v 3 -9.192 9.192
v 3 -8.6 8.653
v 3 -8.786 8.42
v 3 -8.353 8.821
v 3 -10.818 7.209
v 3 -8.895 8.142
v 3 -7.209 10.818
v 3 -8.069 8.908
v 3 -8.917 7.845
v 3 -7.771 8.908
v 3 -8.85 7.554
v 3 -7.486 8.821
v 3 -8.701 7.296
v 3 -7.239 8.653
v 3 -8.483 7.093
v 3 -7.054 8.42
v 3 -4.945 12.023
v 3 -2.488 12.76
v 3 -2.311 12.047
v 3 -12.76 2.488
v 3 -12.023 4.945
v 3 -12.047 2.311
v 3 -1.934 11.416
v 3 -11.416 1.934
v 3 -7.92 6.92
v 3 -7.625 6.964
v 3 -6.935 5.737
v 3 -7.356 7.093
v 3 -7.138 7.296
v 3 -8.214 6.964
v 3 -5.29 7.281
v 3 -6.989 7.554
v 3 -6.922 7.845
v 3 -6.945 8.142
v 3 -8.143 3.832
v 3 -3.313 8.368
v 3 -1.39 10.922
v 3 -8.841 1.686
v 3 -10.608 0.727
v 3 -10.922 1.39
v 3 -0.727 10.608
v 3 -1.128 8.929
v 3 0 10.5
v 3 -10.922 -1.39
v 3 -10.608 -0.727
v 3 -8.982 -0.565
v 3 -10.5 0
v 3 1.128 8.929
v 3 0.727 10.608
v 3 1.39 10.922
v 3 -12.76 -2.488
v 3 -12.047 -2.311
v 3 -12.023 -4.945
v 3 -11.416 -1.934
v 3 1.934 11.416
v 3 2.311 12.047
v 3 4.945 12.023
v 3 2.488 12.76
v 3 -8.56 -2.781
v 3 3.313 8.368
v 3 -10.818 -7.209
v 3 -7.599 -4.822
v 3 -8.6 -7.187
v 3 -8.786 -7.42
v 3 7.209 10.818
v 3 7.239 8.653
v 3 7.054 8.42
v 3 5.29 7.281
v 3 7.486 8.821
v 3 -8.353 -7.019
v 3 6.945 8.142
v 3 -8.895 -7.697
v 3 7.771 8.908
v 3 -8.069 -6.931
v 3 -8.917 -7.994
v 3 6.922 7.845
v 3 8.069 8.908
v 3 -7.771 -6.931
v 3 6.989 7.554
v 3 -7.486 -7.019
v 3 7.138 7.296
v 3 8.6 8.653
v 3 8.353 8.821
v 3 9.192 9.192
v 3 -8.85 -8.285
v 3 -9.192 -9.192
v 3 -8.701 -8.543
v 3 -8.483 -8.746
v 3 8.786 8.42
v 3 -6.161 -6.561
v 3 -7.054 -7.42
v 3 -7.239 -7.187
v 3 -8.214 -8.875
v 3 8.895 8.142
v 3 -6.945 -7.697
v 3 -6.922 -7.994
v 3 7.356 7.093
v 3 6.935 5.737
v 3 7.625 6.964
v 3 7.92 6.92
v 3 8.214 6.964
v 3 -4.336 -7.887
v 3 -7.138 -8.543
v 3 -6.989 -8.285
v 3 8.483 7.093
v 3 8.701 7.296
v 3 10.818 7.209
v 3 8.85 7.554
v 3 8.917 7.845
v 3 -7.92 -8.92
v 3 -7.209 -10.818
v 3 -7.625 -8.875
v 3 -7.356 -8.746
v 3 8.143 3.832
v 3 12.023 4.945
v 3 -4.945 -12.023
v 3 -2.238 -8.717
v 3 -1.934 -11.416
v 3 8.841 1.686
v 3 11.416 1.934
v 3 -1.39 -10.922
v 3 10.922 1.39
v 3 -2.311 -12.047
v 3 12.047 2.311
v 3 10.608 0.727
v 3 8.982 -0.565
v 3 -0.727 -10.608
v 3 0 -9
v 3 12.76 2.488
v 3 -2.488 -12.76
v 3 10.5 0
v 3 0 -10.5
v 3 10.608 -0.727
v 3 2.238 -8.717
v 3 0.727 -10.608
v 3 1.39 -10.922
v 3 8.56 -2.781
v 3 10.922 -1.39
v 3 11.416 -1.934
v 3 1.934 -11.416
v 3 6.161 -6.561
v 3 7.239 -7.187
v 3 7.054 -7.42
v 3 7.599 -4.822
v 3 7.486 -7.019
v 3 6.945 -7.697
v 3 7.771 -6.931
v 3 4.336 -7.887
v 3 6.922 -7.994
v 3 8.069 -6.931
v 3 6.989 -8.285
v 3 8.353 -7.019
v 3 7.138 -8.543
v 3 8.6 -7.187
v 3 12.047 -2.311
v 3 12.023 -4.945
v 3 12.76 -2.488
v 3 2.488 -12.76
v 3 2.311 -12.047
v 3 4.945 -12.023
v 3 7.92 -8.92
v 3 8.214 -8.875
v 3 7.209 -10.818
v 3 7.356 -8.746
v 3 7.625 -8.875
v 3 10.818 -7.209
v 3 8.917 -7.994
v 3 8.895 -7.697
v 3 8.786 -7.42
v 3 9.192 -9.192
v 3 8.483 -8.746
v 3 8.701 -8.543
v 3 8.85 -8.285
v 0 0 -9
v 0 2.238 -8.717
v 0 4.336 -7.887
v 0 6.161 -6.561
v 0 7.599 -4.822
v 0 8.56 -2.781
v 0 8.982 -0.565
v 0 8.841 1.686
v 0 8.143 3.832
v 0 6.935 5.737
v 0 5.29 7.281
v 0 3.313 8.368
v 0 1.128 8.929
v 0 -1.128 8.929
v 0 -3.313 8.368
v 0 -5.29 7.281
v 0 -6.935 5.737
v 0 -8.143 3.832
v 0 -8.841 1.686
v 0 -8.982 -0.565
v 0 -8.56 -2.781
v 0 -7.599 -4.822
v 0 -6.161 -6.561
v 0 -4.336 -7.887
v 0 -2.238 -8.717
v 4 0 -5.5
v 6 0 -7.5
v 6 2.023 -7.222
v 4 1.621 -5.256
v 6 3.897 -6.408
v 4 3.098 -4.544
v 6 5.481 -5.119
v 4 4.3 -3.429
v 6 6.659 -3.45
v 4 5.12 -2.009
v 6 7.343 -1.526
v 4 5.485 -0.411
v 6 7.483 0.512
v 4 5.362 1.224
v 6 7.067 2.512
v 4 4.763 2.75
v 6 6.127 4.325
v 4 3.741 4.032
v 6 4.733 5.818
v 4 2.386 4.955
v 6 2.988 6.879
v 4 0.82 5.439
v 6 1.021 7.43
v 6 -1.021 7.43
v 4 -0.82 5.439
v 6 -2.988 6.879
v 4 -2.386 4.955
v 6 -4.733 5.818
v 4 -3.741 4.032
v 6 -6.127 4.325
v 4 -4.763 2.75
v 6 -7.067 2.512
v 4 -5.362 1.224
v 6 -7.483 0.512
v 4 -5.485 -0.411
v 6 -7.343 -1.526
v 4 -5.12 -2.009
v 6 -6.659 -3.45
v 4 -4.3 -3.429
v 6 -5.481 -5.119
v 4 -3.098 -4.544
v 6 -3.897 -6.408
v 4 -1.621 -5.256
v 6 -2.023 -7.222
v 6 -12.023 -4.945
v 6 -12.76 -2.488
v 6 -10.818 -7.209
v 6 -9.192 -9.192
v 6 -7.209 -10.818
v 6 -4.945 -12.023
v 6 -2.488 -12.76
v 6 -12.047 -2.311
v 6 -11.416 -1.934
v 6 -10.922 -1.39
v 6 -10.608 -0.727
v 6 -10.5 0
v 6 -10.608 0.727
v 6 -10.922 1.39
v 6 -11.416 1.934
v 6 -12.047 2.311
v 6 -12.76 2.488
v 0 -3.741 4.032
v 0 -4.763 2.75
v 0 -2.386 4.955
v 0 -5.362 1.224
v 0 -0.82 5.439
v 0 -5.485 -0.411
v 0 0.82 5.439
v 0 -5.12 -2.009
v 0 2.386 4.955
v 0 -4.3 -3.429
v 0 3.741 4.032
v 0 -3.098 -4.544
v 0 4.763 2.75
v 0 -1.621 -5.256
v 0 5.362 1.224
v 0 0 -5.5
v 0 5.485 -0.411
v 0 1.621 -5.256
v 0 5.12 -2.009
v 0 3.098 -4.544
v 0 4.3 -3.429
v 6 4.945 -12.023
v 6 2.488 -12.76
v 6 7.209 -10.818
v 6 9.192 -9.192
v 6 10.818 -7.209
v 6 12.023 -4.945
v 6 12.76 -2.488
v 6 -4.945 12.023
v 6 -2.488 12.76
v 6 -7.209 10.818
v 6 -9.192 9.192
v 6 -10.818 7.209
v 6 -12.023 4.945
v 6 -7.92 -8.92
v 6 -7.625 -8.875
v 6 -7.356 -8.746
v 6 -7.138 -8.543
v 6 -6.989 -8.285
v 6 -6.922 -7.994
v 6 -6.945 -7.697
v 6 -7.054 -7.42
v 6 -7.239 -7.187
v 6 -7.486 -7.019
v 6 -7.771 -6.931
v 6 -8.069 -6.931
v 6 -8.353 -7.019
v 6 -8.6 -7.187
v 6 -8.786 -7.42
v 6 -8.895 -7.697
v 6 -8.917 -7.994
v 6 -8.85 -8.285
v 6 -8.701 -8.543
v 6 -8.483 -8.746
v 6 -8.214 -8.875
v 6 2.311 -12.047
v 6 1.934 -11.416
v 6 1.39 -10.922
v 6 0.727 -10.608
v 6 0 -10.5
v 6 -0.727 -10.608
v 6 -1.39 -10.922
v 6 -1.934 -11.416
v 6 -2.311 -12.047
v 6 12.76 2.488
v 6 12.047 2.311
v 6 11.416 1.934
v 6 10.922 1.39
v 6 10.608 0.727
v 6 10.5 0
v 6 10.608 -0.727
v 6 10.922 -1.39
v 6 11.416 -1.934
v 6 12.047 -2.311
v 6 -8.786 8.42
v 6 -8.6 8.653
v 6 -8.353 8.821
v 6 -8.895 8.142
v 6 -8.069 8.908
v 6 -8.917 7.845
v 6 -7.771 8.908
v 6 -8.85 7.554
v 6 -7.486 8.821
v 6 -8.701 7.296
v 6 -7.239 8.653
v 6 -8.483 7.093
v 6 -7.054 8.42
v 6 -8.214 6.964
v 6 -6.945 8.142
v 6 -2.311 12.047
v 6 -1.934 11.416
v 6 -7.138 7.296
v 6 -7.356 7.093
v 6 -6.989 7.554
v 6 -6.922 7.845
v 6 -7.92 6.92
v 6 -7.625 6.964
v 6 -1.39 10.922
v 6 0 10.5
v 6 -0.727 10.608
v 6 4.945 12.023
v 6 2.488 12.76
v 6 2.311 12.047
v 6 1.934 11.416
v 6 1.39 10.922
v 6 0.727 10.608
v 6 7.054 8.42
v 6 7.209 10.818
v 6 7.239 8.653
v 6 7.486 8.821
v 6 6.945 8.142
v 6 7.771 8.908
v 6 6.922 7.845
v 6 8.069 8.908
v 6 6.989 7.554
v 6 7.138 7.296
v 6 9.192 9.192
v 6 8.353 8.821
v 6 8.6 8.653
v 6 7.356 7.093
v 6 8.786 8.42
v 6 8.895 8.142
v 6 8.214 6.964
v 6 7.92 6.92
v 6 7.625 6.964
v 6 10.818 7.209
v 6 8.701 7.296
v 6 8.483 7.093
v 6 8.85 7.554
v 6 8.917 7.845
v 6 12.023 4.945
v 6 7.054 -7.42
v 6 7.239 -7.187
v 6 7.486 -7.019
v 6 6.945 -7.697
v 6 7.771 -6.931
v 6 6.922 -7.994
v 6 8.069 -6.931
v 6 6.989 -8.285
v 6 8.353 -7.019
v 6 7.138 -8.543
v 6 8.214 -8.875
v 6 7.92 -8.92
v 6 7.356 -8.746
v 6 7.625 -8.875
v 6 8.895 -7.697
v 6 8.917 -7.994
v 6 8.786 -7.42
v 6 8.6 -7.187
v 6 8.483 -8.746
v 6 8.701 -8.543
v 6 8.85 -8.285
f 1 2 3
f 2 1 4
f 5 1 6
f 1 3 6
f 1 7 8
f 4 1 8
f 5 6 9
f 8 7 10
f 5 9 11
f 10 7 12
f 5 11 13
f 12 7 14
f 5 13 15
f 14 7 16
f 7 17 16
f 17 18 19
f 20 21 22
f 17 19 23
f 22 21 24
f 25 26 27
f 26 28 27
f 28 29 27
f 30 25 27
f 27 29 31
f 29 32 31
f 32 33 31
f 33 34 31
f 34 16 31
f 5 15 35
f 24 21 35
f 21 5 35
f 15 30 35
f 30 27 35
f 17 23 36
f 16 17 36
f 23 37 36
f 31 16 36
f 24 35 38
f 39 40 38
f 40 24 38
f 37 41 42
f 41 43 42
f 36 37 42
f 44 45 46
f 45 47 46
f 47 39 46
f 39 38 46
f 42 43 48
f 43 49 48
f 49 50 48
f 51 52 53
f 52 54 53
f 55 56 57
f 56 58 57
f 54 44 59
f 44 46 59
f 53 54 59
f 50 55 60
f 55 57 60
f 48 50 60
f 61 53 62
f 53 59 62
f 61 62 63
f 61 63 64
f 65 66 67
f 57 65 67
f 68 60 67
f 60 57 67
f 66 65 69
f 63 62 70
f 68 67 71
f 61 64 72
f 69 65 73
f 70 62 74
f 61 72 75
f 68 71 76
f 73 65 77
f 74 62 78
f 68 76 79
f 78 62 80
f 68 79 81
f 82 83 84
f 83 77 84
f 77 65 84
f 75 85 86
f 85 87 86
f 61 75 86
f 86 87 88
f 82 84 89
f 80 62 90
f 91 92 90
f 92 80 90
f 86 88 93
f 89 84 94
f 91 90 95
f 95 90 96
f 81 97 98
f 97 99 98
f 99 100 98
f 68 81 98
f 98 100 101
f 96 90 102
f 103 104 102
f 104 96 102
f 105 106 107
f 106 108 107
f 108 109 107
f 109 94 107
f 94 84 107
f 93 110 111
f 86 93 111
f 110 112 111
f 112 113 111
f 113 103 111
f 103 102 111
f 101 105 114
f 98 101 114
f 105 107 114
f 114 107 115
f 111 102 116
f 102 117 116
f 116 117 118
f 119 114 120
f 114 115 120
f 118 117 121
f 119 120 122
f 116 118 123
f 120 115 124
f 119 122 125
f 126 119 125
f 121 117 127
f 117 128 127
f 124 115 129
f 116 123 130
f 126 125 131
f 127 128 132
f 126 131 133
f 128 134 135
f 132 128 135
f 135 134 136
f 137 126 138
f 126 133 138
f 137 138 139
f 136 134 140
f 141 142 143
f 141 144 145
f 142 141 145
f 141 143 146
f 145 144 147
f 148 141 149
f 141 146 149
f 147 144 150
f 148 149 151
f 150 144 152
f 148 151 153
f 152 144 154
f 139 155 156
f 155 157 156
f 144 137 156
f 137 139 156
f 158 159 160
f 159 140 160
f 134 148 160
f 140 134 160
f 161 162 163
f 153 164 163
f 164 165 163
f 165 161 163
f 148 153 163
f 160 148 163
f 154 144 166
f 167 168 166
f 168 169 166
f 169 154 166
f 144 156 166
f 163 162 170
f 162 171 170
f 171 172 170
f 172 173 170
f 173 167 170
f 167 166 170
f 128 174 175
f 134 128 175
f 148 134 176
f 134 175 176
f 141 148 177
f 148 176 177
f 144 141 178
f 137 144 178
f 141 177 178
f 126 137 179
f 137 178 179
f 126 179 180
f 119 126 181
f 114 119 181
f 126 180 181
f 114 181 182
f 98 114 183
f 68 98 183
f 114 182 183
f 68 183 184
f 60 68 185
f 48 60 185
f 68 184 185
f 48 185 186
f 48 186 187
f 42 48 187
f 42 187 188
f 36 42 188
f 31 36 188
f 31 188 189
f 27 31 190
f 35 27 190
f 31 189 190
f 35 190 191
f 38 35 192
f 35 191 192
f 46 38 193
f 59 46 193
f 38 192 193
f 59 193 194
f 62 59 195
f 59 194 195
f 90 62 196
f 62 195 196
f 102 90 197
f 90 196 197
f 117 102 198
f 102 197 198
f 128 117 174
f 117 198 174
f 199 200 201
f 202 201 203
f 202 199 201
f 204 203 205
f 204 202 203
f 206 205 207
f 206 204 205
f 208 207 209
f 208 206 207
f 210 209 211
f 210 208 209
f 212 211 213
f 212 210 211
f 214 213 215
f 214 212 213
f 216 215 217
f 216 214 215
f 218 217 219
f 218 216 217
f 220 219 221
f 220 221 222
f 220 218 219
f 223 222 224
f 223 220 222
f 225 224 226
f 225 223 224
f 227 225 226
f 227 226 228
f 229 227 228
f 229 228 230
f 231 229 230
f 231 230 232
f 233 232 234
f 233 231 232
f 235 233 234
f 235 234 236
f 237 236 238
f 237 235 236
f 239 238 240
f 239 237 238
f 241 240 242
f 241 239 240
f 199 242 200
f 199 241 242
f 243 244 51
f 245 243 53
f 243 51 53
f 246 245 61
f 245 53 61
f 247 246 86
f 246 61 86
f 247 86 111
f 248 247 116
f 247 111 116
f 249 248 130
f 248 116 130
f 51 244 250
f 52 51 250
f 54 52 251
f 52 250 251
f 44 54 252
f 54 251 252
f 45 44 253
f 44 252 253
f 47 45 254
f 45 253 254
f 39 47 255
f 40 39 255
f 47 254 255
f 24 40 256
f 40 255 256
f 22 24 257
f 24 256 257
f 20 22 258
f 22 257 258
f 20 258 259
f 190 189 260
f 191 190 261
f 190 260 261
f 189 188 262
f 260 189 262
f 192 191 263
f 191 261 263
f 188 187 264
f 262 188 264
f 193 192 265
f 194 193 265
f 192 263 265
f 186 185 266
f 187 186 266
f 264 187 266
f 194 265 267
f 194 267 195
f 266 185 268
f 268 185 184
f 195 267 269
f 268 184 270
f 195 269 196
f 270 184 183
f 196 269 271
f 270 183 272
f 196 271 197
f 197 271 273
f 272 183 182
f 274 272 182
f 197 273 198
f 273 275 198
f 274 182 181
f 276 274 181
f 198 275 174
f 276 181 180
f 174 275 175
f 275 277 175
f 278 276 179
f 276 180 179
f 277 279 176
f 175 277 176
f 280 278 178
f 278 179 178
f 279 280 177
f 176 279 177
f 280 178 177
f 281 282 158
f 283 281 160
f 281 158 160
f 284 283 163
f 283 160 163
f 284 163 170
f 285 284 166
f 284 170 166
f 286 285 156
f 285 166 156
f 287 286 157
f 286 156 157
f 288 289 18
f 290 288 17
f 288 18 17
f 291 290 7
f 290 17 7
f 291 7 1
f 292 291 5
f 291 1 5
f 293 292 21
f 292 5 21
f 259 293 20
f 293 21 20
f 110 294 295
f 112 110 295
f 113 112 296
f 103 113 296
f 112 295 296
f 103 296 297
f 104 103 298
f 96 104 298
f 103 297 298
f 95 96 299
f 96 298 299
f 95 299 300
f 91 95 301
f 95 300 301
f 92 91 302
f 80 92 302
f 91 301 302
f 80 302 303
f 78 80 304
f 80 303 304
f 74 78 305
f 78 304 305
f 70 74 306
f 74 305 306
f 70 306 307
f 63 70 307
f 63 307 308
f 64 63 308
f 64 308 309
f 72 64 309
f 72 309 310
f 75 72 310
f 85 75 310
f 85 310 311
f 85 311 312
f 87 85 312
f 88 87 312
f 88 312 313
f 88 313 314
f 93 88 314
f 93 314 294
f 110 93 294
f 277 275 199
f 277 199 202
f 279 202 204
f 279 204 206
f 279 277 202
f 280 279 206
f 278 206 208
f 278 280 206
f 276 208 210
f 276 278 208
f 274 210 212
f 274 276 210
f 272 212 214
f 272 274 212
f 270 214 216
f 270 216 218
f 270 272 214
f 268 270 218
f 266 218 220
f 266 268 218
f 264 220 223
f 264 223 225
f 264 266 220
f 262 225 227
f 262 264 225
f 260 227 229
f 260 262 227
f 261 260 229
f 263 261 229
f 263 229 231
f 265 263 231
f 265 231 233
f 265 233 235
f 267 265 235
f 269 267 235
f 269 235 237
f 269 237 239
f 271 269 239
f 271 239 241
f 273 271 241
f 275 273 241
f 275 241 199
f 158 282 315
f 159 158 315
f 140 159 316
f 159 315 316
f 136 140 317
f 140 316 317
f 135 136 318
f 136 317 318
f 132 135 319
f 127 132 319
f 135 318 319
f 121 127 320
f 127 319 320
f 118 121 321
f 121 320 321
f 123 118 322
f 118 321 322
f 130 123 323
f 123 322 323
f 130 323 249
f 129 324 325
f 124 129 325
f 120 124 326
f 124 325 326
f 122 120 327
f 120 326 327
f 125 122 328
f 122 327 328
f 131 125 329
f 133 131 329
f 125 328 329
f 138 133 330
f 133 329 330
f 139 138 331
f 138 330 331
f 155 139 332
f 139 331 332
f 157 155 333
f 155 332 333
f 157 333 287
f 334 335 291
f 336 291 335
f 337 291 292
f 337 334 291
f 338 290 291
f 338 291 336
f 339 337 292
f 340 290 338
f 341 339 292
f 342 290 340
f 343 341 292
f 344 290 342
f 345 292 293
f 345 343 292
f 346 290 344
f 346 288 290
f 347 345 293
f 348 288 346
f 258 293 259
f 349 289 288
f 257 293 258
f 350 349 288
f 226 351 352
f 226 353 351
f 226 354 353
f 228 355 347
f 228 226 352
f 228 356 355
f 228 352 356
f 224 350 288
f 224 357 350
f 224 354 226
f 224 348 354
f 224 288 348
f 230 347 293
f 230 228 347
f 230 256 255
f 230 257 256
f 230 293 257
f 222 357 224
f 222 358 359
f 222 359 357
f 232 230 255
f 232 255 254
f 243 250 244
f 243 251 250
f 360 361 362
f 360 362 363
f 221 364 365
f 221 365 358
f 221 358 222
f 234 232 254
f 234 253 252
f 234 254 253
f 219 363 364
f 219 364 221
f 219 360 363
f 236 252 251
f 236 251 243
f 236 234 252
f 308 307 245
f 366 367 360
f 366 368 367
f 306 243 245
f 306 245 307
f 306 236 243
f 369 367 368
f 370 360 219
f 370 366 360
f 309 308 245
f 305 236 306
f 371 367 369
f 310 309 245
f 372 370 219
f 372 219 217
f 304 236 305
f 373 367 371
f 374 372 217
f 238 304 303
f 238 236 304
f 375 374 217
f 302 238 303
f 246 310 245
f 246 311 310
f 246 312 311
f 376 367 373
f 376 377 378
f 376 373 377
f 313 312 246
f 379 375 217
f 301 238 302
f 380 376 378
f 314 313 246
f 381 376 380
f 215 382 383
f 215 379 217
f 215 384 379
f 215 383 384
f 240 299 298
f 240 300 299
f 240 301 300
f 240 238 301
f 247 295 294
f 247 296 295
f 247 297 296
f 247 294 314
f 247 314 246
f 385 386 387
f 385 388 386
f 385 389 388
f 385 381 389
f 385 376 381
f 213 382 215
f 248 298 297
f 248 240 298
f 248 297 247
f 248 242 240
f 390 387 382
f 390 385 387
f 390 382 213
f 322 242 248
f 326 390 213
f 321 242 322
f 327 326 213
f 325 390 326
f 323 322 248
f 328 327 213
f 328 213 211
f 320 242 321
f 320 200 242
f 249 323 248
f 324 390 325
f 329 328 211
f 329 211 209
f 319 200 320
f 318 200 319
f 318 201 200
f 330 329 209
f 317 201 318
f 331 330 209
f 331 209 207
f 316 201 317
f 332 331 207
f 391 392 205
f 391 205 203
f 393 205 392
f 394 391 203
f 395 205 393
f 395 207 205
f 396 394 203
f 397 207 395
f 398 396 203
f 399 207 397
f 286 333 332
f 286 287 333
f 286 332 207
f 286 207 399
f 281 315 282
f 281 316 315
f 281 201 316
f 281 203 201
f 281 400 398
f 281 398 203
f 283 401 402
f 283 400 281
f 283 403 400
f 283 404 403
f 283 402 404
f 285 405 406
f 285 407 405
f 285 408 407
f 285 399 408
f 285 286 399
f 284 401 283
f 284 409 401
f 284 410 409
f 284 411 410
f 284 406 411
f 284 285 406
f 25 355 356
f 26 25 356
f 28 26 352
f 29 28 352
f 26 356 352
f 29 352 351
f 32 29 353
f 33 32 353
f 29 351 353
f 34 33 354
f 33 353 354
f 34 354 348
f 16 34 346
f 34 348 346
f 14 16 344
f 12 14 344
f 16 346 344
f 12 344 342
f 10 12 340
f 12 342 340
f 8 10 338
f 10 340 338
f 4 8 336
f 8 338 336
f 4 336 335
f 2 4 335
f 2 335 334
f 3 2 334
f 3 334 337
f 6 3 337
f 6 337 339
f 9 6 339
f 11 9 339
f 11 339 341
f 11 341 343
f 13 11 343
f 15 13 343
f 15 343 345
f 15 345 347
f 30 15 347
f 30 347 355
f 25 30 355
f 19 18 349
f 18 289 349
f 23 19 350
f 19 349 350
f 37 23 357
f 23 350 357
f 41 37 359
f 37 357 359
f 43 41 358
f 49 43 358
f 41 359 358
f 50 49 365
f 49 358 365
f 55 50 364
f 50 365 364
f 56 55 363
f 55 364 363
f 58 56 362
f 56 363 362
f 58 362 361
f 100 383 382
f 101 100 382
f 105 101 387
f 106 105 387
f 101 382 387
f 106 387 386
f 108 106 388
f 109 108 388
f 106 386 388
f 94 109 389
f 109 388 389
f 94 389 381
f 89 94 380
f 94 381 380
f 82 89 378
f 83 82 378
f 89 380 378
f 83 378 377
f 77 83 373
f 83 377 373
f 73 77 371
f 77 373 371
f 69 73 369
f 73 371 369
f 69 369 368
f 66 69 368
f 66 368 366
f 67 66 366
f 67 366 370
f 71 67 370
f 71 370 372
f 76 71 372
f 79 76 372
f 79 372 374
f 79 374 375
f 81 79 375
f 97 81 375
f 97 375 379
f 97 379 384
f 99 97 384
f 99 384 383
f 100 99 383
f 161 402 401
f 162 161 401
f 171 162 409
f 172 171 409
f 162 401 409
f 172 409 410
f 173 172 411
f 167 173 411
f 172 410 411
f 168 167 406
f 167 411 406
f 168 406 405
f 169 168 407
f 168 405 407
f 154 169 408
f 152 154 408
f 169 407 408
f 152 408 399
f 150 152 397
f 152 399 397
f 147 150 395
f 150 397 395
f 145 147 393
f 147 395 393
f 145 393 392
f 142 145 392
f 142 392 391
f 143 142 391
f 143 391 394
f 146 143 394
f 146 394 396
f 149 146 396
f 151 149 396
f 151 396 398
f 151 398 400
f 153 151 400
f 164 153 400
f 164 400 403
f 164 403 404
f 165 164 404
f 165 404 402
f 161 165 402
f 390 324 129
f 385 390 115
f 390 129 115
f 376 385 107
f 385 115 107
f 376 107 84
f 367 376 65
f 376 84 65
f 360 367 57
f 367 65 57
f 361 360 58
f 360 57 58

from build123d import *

# Parameters (mm, degrees)
SKETCH1_R           = 9
SKETCH1_R_2         = 5.5
BOSS_EXTRUDE1_DEPTH = 3
SKETCH2_R           = 13
SKETCH2_R_2         = 5.5
BOSS_EXTRUDE2_DEPTH = 3
SKETCH3_R           = 1
SKETCH3_R_2         = 2.5
CUT_EXTRUDE1_DEPTH  = 20.339079606
CHAMFER1_SIZE       = 2


with BuildPart() as part:
    # Sketch1 → Boss-Extrude1 (new body)
    with BuildSketch(Plane(origin=(0, 0, 0), x_dir=(0, 0, -1), z_dir=(1, 0, 0))):
        Circle(SKETCH1_R)
        Circle(SKETCH1_R_2, mode=Mode.SUBTRACT)
    extrude(amount=BOSS_EXTRUDE1_DEPTH)

    # Sketch2 → Boss-Extrude2 (add)
    with BuildSketch(Plane(origin=(3, 0, 0), x_dir=(0, 0, -1), z_dir=(1, 0, 0))):
        Circle(SKETCH2_R)
        Circle(SKETCH2_R_2, mode=Mode.SUBTRACT)
    extrude(amount=BOSS_EXTRUDE2_DEPTH)

    # Sketch3 → Cut-Extrude1 (cut, through all)
    with BuildSketch(Plane(origin=(6, 0, 0), x_dir=(0, 0, -1), z_dir=(1, 0, 0))):
        with Locations((7.919595949, 7.919595949)):
            Circle(SKETCH3_R)
        with Locations((7.919595949, -7.919595949)):
            Circle(SKETCH3_R)
        with Locations((-7.919595949, -7.919595949)):
            Circle(SKETCH3_R)
        with Locations((-7.919595949, 7.919595949)):
            Circle(SKETCH3_R)
        with Locations((0, 13)):
            Circle(SKETCH3_R_2)
        with Locations((13, 0)):
            Circle(SKETCH3_R_2)
        with Locations((0, -13)):
            Circle(SKETCH3_R_2)
        with Locations((-13, 0)):
            Circle(SKETCH3_R_2)
    extrude(amount=-CUT_EXTRUDE1_DEPTH, mode=Mode.SUBTRACT)

    # Chamfer1
    chamfer1_edges = [part.edges().sort_by_distance(p)[0] for p in [
        (6, 0, 5.5),
    ]]
    chamfer(chamfer1_edges, length=CHAMFER1_SIZE)


solid = part.part
